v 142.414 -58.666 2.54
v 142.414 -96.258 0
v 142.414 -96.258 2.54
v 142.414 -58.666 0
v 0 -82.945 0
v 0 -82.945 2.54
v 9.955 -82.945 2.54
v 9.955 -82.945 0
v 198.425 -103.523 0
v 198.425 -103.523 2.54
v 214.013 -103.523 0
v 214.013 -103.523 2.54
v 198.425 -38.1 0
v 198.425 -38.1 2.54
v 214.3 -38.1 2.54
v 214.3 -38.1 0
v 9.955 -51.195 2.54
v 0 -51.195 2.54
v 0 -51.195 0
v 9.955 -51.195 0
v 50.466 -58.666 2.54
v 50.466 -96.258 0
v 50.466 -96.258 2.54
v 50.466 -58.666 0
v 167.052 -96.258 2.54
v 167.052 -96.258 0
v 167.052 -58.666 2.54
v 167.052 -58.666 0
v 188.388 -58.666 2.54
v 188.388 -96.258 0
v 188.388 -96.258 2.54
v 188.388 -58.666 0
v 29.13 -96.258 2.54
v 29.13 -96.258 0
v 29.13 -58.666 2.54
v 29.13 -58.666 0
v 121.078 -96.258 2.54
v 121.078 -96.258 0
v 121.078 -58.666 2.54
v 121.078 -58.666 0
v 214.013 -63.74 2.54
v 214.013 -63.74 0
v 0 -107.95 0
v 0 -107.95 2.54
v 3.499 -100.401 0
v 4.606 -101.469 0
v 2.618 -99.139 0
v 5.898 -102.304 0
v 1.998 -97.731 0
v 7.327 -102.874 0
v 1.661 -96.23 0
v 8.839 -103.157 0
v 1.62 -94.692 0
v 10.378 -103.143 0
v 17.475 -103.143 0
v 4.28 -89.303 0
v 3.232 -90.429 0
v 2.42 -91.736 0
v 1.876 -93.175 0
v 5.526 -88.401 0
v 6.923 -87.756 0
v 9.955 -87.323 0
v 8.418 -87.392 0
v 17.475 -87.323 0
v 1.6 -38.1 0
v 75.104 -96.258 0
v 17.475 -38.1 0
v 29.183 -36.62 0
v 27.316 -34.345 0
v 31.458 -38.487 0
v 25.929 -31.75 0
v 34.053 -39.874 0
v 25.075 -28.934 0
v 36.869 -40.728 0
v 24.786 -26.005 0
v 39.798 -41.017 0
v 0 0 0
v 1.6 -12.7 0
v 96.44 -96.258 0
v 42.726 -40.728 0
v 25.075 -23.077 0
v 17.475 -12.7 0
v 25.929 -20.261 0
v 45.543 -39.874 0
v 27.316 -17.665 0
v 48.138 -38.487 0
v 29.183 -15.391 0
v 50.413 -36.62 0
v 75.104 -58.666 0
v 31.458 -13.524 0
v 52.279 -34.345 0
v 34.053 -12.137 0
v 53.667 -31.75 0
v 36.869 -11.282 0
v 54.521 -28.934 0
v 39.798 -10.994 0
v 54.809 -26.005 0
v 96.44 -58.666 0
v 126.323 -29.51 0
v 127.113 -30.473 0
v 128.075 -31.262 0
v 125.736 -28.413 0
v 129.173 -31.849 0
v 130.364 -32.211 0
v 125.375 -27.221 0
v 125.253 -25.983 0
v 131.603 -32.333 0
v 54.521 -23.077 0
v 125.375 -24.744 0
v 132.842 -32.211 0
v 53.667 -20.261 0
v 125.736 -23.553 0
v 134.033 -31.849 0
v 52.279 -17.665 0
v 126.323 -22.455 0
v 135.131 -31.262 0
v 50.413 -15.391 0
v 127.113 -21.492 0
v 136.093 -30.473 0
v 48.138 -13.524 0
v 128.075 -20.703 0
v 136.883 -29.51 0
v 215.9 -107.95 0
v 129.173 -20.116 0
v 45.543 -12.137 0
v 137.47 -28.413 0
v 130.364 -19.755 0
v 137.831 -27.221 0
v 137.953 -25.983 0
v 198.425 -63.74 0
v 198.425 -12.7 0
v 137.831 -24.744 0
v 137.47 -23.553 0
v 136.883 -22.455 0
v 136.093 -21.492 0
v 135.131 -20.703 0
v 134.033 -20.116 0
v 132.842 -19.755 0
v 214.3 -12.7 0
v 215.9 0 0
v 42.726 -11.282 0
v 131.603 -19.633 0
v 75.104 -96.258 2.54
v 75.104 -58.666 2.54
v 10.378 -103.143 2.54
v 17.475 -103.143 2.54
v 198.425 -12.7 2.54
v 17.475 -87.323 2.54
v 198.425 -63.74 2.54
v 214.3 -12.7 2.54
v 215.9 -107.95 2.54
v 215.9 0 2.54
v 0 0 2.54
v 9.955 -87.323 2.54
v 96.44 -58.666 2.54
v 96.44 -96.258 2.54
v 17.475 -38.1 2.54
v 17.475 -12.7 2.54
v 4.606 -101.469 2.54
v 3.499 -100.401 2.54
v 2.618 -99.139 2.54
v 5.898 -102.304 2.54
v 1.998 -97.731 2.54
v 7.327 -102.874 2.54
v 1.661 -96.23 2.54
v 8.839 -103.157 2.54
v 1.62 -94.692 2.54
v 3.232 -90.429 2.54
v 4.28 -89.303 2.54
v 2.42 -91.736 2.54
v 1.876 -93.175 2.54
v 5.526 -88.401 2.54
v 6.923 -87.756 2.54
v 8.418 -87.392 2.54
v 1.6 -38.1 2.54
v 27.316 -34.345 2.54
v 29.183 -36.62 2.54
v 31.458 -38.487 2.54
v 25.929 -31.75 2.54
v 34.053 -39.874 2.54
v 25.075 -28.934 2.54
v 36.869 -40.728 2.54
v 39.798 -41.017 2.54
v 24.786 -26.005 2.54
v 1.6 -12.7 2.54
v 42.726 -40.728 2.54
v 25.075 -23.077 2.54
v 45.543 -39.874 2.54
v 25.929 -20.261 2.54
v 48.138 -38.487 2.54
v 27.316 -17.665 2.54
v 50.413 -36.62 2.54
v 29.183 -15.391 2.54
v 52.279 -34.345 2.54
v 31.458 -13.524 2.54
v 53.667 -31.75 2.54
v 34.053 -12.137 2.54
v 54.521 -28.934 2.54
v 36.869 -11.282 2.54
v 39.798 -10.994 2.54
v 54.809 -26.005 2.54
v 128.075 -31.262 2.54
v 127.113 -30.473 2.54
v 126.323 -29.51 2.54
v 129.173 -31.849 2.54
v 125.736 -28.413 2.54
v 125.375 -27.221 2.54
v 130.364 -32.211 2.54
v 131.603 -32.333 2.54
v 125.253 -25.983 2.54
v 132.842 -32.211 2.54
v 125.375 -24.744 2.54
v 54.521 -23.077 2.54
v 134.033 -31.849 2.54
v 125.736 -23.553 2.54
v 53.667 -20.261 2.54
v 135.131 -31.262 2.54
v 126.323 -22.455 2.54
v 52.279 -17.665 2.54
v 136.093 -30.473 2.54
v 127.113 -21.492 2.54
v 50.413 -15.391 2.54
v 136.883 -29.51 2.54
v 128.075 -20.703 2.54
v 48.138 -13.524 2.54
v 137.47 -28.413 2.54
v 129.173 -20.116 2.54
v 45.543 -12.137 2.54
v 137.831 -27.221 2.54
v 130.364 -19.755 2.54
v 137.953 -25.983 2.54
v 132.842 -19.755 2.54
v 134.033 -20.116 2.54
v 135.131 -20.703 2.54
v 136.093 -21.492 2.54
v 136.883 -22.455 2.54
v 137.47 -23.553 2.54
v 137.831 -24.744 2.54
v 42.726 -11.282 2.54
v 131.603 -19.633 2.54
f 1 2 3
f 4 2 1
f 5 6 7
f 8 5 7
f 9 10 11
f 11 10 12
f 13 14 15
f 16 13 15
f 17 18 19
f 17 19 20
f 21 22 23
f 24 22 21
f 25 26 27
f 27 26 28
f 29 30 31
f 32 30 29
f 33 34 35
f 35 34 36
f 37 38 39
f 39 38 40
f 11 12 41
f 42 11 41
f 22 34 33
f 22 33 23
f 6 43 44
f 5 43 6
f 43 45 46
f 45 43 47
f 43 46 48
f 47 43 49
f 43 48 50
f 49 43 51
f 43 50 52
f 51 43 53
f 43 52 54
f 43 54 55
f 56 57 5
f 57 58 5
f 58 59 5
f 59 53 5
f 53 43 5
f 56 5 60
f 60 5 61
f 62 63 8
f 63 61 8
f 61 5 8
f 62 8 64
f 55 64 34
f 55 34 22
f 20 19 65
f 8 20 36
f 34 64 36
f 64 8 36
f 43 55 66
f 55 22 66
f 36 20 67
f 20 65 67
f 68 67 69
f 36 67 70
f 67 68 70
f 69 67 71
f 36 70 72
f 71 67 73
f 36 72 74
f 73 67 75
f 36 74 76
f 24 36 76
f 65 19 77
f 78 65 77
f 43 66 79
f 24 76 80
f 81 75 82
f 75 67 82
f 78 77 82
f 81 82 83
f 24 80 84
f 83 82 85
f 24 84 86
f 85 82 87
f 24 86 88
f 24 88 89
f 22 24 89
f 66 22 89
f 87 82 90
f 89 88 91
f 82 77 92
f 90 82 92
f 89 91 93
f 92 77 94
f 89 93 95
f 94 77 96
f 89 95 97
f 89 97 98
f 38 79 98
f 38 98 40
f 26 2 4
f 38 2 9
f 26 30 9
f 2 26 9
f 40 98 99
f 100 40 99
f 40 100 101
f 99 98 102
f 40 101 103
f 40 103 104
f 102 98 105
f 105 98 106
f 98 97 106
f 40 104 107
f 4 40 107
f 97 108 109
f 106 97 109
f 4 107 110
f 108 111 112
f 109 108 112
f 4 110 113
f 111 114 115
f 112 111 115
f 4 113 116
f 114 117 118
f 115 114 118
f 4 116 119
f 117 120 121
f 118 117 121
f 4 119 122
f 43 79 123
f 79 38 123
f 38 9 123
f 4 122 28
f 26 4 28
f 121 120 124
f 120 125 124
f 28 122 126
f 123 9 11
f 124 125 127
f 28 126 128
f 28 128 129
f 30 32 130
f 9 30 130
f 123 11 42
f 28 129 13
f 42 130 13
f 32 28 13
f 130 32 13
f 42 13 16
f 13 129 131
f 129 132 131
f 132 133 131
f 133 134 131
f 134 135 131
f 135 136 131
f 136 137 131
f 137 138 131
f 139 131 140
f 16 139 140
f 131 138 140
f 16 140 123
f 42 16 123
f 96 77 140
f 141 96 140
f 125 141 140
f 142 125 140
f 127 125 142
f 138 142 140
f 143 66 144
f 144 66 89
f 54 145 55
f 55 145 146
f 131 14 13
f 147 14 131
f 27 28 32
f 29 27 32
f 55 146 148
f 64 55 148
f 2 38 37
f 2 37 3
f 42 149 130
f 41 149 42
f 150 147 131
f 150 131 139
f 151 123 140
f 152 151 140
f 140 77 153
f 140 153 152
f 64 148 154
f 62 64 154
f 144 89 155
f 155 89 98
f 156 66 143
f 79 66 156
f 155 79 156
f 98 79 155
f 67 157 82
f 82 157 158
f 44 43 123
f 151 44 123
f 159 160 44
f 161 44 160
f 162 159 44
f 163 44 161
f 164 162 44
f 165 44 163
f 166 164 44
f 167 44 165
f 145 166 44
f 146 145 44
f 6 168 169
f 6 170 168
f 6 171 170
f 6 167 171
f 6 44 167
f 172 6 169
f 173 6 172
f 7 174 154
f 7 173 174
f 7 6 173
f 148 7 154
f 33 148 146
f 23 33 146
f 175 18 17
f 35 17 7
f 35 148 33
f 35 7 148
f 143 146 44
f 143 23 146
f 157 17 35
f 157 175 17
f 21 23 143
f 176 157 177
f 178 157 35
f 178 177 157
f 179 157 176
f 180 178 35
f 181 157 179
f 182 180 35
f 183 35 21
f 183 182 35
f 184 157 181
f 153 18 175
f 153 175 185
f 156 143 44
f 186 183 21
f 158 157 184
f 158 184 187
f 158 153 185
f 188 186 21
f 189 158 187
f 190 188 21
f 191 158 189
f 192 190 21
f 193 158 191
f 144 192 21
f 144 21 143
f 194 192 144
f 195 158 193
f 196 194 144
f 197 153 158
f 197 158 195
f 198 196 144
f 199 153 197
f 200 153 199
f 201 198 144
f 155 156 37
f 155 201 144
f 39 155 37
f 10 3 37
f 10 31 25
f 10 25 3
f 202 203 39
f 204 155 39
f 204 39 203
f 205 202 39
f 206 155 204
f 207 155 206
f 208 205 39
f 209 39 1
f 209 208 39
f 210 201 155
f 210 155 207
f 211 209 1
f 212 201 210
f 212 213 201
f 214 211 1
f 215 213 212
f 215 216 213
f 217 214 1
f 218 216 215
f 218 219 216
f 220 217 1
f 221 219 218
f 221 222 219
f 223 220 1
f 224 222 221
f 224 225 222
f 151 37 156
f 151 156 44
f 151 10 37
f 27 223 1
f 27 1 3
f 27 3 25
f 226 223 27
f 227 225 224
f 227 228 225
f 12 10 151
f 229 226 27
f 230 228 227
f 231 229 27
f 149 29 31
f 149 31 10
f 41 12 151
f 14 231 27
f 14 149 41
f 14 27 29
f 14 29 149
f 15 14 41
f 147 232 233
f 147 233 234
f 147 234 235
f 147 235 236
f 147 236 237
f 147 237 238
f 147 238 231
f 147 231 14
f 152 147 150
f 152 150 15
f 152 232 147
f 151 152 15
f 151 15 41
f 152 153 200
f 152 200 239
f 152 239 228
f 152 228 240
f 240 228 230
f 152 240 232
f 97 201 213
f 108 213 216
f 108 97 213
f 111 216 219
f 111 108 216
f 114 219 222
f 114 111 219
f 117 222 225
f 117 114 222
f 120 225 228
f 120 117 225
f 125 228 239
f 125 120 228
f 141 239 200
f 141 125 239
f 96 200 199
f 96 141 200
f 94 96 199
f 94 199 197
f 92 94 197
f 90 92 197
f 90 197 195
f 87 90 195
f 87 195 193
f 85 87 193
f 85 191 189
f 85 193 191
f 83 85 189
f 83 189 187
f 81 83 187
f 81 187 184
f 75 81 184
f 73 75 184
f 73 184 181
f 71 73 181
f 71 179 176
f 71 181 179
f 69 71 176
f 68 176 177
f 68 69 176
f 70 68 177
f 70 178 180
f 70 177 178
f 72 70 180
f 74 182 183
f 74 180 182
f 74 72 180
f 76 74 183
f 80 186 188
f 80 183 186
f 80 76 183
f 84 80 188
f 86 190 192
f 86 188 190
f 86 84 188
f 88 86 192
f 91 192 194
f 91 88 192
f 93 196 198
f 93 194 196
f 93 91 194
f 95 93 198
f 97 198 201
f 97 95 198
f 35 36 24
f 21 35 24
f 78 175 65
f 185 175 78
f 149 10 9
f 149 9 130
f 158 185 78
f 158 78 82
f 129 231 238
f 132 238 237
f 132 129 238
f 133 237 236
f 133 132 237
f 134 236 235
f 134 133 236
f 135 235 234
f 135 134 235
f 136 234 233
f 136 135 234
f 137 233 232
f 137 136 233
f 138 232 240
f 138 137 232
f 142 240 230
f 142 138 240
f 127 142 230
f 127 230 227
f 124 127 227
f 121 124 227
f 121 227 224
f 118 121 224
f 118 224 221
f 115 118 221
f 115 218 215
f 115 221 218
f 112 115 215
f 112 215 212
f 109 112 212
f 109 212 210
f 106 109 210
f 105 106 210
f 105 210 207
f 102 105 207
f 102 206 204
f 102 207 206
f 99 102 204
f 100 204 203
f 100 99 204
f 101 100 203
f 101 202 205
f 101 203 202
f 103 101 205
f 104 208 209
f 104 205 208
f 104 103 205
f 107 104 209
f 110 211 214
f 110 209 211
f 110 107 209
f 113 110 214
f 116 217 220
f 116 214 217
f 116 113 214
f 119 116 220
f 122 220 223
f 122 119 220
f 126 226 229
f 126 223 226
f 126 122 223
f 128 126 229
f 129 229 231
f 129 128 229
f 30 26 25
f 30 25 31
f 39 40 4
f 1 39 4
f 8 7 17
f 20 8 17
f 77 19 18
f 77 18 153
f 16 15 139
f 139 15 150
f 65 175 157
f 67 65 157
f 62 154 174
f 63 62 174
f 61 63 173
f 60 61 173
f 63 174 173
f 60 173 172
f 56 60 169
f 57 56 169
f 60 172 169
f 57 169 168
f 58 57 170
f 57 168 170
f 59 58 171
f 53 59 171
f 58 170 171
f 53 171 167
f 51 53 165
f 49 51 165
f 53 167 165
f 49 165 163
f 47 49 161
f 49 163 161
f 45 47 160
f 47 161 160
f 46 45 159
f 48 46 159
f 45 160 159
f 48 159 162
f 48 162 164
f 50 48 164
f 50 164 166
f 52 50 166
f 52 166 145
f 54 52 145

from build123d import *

# Parameters (mm, degrees)
F0_W     = 215.9
F0_H     = 107.95
F1_DEPTH = 2.54
F2_R     = 15.0114
F2_W     = 21.336
F2_H     = 37.592
F2_R_2   = 6.35
F3_DEPTH = 25.4
F4_W     = 15.875
F4_H     = 25.4
F4_W_2   = 15.588598
F4_H_2   = 39.783249
F5_DEPTH = 25.4
F6_W     = 9.954944
F6_H     = 31.75
F7_DEPTH = 25.4


with BuildPart() as f1:
    # F0 (on Top) → F1 (new body)
    with BuildSketch(Plane.XY):
        with Locations((107.95, -53.975)):
            Rectangle(F0_W, F0_H)
    extrude(amount=F1_DEPTH)

    # F2 (on face) → F3 (cut)
    with BuildSketch(Plane.XY):
        with Locations((39.7979, -26.005359)):
            Circle(F2_R)
        with Locations((39.7979, -77.462117)):
            Rectangle(F2_W, F2_H)
        with Locations((85.7719, -77.462117)):
            Rectangle(F2_W, F2_H)
        with Locations((131.7459, -77.462117)):
            Rectangle(F2_W, F2_H)
        with Locations((177.7199, -77.462117)):
            Rectangle(F2_W, F2_H)
        with Locations((131.603076, -25.982544)):
            Circle(F2_R_2)
    extrude(amount=F3_DEPTH, mode=Mode.SUBTRACT)

    # F4 (on face) → F5 (cut)
    with BuildSketch(Plane.XY.offset(2.54)):
        with Locations((9.5377, -25.4)):
            Rectangle(F4_W, F4_H)
        with BuildLine():
            Line((17.4752, -87.323474), (9.954944, -87.323474))
            ThreePointArc((9.954944, -87.323474), (1.603036, -95.462154), (10.377918, -103.142904))
            Line((10.377918, -103.142904), (17.4752, -103.142904))
            Line((17.4752, -103.142904), (17.4752, -87.323474))
        make_face()
        with Locations((206.3623, -25.4)):
            Rectangle(F4_W, F4_H)
        with Locations((206.219099, -83.631156)):
            Rectangle(F4_W_2, F4_H_2)
    extrude(amount=-F5_DEPTH, mode=Mode.SUBTRACT)

    # F6 (on face) → F7 (cut)
    with BuildSketch(Plane.XY.offset(2.54)):
        with Locations((4.977472, -67.070287)):
            Rectangle(F6_W, F6_H)
    extrude(amount=-F7_DEPTH, mode=Mode.SUBTRACT)


solid = f1.part
